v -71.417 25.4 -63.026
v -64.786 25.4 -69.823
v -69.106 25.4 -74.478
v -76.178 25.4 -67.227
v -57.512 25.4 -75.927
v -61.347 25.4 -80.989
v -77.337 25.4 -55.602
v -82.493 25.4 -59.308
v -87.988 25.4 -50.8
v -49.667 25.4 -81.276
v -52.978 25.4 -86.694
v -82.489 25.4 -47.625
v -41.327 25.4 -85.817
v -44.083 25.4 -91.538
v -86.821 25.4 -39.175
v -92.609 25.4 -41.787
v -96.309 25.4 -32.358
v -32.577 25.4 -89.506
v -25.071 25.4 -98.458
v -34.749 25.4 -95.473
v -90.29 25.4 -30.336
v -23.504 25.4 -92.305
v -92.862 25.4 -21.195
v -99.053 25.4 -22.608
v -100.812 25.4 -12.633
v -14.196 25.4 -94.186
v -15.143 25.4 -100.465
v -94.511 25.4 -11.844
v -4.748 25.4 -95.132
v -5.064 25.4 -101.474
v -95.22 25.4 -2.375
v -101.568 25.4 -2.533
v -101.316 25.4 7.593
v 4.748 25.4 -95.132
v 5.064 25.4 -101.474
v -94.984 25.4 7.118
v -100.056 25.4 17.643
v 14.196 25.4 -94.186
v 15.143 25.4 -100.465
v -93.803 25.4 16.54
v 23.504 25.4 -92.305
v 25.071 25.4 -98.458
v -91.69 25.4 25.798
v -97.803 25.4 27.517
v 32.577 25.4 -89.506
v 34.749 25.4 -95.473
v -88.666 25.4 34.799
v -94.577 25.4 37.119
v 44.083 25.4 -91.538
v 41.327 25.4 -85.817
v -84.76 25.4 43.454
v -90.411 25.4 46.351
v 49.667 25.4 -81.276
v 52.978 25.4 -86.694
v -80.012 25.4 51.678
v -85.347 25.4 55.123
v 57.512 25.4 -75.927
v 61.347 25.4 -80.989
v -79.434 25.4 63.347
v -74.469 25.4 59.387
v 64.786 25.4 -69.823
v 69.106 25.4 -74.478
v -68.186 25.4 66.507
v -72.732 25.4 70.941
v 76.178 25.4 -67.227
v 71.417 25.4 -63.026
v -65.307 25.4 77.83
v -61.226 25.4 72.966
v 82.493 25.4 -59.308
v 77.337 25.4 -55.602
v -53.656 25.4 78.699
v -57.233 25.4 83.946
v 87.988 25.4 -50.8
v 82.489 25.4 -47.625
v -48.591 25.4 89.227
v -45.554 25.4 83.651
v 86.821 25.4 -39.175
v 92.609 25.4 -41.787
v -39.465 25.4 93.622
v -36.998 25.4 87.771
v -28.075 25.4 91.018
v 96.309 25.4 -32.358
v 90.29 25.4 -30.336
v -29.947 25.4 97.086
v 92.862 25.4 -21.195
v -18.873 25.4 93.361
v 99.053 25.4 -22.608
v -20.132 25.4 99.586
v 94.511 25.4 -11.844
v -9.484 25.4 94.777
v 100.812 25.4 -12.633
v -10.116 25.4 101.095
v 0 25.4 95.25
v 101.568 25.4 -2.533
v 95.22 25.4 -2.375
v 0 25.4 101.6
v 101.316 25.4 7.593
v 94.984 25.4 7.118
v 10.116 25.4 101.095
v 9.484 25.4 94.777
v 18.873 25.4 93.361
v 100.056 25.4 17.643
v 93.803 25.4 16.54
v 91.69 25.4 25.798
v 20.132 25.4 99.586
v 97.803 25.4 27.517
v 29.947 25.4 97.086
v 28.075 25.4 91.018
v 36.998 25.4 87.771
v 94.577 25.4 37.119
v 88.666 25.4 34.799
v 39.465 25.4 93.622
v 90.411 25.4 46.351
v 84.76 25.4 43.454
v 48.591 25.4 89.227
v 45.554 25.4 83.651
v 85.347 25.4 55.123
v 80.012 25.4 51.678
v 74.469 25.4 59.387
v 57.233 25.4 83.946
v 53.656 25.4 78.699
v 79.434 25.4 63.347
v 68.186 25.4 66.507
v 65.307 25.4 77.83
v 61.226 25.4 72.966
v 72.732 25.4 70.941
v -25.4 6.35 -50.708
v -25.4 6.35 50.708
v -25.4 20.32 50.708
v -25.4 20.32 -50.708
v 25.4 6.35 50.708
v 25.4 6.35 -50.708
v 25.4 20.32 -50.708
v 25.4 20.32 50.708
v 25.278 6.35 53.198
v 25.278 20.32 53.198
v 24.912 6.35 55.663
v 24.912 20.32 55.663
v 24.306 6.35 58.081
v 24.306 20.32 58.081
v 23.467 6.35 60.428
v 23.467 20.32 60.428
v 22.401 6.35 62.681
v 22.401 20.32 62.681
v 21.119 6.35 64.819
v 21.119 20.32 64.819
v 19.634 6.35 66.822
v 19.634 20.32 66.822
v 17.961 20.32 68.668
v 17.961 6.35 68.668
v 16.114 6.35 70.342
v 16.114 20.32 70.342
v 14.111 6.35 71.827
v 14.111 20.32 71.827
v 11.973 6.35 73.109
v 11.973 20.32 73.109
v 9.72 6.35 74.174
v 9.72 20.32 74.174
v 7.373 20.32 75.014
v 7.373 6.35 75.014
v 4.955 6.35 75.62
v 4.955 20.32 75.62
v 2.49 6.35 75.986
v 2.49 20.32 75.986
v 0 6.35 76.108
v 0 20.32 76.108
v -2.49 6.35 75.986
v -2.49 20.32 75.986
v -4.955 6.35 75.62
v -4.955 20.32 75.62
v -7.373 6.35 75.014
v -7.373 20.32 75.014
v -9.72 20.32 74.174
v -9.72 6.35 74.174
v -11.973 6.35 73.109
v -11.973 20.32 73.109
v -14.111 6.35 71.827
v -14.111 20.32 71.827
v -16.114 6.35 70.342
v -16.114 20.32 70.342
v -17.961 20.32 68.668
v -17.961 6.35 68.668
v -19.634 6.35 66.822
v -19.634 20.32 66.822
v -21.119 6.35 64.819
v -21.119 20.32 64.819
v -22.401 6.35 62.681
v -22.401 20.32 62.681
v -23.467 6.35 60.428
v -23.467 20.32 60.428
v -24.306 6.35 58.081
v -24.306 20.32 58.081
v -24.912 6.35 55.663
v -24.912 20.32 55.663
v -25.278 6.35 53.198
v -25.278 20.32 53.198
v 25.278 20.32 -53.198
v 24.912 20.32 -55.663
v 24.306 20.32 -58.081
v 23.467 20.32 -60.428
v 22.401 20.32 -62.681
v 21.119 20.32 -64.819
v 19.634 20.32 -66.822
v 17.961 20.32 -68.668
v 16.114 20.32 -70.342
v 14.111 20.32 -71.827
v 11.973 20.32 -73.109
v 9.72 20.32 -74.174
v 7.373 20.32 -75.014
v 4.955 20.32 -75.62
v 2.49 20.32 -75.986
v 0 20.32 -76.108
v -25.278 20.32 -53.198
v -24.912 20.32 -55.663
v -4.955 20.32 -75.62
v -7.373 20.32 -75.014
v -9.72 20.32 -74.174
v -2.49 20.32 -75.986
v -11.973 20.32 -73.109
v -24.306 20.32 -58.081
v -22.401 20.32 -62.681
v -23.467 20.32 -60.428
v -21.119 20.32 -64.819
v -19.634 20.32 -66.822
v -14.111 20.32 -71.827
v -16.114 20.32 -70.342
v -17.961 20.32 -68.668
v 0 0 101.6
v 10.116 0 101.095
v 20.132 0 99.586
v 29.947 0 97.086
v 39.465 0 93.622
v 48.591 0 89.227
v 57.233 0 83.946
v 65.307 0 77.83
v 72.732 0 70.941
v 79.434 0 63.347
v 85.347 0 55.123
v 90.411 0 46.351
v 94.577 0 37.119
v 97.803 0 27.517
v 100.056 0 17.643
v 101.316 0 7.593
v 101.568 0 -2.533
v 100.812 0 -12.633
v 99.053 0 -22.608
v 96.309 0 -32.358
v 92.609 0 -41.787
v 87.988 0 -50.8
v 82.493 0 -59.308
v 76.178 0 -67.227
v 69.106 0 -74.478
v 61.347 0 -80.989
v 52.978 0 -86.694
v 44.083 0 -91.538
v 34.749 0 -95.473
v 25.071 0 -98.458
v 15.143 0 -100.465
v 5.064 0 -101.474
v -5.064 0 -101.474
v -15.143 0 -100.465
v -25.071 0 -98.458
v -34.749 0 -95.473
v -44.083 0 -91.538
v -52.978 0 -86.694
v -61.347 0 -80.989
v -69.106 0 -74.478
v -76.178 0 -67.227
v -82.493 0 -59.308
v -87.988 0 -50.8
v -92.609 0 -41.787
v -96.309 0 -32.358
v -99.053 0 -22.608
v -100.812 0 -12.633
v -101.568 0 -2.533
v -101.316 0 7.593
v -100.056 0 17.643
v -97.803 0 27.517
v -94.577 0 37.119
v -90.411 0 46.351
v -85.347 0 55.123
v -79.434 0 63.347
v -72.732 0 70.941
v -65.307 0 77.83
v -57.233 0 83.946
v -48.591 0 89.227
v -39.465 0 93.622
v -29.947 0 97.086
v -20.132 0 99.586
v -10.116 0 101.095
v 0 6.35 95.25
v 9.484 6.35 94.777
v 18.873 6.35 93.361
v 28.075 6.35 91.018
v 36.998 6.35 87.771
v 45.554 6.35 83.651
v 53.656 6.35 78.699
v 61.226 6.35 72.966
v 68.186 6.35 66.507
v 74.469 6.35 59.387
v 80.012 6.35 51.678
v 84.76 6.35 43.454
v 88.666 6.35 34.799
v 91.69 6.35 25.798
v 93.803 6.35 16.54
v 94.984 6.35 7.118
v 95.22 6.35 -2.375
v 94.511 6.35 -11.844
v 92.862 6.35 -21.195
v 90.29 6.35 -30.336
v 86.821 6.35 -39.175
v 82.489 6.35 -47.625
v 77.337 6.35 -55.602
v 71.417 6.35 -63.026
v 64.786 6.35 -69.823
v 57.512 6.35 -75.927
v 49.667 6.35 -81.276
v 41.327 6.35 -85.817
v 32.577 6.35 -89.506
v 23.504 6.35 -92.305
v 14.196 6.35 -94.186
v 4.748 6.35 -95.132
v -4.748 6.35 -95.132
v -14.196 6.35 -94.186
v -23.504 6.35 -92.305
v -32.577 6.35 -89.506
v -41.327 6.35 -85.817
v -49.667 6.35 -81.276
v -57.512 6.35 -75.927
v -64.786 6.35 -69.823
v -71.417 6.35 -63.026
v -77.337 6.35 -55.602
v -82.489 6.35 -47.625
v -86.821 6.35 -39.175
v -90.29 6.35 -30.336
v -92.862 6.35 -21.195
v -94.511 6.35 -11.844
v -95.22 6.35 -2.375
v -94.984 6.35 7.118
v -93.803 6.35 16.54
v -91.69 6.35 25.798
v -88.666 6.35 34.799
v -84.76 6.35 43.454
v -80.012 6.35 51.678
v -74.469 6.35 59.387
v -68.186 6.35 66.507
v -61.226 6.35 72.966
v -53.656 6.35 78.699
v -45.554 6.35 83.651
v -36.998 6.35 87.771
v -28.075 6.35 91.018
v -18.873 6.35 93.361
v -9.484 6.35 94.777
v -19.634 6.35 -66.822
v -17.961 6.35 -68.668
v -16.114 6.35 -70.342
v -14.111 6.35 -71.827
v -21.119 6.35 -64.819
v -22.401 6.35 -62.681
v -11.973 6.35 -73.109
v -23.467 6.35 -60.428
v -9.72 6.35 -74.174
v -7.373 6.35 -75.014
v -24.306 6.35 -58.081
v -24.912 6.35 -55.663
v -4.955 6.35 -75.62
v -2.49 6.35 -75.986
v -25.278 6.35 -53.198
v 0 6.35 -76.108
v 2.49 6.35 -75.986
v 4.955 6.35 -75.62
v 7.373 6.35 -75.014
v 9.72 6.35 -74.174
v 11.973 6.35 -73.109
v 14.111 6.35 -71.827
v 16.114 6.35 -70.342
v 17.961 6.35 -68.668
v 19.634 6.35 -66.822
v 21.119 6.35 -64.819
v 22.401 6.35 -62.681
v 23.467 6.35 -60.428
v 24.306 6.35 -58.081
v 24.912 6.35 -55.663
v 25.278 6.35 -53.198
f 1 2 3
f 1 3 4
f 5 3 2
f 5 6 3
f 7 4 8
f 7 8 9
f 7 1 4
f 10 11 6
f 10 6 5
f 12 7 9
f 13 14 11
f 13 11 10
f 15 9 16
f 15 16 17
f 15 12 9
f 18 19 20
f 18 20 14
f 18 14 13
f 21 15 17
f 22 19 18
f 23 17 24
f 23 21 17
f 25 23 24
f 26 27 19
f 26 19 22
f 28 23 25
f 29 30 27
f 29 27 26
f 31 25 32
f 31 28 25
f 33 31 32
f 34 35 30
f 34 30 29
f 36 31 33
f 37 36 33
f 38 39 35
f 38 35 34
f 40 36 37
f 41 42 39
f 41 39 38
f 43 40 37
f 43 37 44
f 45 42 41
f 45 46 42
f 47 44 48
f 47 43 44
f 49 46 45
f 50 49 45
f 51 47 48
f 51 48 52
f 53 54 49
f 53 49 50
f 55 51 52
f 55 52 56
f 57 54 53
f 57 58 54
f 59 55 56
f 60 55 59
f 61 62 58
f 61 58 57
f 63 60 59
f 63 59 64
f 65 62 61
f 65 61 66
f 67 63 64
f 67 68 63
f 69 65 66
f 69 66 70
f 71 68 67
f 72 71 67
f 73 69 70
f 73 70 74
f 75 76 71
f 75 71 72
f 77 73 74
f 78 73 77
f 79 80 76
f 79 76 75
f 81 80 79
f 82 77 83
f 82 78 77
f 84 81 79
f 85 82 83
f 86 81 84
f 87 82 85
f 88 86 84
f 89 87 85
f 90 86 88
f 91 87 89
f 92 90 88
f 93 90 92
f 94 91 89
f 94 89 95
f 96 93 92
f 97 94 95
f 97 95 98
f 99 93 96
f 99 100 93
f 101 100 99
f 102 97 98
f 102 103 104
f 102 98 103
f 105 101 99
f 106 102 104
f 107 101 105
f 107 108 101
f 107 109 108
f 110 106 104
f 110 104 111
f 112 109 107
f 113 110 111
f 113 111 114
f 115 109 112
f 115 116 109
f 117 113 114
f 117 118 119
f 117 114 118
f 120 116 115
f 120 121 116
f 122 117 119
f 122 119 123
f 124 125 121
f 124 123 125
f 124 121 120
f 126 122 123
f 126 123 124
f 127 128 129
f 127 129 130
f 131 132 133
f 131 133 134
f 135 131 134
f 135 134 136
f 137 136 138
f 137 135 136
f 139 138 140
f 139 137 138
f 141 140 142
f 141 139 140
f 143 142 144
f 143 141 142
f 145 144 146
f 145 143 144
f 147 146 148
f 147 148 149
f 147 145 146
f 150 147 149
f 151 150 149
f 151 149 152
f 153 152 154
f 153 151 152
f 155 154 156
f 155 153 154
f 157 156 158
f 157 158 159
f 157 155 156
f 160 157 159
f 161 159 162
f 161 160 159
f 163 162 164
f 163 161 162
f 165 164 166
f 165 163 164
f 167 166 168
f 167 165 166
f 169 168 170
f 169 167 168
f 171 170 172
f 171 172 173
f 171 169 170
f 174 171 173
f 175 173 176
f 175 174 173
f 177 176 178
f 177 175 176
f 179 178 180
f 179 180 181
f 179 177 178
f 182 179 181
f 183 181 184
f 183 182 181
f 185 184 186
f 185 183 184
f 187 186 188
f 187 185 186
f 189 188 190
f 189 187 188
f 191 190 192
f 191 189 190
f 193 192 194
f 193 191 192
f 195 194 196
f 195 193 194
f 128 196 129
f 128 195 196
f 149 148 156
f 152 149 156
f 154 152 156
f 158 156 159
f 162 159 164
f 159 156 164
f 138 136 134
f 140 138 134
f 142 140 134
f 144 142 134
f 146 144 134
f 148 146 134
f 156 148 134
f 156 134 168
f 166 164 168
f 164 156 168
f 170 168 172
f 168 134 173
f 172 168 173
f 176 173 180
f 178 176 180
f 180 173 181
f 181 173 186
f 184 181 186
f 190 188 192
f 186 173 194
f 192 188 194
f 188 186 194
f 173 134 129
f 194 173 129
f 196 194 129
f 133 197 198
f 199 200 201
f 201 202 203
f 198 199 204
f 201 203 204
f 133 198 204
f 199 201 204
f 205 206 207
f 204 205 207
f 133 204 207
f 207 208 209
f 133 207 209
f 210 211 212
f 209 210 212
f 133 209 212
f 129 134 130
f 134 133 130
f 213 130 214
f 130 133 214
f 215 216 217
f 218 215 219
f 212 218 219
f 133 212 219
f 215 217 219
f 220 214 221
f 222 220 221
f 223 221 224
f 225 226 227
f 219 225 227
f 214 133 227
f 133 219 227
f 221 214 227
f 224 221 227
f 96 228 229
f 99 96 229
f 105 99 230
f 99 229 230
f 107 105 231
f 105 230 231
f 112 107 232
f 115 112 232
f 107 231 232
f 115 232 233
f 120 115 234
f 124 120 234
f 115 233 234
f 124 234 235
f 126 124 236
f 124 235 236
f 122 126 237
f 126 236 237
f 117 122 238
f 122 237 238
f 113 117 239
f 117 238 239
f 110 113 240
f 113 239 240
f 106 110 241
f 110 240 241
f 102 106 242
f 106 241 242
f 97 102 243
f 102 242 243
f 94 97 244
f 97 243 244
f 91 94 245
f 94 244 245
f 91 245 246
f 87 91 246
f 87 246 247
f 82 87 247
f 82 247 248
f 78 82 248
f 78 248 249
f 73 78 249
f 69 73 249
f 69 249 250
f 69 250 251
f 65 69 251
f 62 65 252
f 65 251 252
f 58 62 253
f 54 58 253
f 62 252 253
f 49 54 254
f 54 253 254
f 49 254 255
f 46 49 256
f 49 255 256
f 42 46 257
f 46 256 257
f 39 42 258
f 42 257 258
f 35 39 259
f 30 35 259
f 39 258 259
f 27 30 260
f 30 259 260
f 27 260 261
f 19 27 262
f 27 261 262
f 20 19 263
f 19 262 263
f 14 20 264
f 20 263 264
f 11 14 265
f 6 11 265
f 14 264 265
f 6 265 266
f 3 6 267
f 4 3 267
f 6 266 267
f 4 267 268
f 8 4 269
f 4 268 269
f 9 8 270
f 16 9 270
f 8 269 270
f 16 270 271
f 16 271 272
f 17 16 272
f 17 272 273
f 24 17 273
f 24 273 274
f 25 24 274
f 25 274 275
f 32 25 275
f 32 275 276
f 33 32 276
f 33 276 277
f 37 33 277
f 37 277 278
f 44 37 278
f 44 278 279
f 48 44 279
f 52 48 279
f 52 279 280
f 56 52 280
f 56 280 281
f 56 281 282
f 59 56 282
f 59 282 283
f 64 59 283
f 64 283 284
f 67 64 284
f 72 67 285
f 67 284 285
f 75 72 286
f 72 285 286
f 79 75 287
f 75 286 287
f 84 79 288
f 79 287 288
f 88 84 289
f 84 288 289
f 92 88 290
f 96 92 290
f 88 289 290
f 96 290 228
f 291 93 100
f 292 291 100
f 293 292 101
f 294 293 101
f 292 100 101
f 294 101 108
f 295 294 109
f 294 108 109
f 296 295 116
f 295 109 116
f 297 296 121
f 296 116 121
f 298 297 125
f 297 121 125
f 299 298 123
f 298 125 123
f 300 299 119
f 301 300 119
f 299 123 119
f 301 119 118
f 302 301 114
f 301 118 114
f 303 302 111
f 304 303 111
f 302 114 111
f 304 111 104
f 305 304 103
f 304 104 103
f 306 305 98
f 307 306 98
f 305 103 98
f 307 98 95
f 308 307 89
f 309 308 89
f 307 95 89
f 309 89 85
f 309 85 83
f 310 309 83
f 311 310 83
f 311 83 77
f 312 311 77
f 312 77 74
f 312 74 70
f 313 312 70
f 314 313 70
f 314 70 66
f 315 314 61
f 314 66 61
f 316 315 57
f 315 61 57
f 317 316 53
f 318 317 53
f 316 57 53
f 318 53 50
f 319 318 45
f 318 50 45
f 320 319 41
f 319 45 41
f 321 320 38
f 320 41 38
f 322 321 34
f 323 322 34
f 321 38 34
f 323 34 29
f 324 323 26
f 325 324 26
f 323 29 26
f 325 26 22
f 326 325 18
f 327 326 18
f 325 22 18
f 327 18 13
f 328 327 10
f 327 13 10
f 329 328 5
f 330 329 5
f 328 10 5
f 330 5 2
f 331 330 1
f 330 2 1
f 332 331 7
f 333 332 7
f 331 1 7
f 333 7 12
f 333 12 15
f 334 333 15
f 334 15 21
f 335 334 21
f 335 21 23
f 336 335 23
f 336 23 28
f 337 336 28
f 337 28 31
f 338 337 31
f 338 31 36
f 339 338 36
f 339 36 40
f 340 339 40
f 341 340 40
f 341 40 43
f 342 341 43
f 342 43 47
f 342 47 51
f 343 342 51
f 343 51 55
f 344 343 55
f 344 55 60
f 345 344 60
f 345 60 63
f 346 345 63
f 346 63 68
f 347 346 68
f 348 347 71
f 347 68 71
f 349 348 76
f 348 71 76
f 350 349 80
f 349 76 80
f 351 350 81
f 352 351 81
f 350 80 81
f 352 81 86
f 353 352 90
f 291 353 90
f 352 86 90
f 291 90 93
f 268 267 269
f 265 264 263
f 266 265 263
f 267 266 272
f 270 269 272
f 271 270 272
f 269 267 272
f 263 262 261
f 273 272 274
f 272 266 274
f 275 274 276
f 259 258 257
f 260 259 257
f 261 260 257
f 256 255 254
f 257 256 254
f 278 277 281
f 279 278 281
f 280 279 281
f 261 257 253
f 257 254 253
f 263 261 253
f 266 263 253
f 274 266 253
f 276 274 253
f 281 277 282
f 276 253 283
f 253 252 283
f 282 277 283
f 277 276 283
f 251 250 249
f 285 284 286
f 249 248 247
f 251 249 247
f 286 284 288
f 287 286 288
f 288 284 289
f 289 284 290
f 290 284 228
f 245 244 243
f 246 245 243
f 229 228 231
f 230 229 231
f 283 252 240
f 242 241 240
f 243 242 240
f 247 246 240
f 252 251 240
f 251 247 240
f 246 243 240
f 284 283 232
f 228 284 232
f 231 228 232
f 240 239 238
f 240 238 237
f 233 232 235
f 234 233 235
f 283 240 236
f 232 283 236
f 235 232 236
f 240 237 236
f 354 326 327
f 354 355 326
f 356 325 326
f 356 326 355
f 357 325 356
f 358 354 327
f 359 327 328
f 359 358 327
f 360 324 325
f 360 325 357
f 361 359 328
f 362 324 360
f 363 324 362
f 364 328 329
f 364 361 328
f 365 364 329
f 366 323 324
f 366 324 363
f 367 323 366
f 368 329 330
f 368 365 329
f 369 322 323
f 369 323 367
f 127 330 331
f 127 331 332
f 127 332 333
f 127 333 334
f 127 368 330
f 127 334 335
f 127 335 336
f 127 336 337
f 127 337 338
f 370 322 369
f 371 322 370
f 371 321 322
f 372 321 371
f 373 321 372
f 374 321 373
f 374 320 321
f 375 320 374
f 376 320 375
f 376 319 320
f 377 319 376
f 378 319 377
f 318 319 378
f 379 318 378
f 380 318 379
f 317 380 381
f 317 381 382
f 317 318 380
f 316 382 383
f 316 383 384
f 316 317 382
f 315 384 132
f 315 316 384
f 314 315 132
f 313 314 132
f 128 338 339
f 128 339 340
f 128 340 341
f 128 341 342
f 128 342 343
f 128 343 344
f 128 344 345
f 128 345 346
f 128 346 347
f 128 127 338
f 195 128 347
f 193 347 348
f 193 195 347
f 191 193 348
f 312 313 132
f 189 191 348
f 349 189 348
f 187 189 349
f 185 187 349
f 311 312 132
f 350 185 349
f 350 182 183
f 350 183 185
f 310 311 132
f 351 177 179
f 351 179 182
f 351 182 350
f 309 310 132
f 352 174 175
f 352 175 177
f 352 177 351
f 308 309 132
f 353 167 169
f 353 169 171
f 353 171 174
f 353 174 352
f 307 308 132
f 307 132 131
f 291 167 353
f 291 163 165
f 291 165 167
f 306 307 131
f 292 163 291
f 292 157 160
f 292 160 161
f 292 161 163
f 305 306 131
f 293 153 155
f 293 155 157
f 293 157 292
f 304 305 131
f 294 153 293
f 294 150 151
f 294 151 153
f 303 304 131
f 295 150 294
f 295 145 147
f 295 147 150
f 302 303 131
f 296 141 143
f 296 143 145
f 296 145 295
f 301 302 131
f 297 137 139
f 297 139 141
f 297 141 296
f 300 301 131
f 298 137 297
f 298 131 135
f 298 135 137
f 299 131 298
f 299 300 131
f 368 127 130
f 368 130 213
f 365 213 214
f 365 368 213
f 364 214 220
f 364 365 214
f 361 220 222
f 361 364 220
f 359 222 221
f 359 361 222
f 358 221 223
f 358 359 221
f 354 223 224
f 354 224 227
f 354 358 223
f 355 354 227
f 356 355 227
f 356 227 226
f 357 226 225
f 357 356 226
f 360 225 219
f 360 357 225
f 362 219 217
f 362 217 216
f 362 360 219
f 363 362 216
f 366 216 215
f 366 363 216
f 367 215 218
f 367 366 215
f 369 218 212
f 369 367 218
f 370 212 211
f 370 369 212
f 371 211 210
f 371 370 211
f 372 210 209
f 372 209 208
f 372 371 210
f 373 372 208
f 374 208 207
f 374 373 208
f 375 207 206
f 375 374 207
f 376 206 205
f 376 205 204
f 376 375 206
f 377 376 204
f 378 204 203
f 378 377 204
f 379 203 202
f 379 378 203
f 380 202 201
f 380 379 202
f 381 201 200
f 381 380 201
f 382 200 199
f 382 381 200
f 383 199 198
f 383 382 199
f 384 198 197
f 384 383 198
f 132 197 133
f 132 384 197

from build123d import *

# Parameters (mm, degrees)
SKETCH1_R           = 101.6
BOSS_EXTRUDE1_DEPTH = 25.4
SKETCH3_R           = 95.25
CUT_EXTRUDE1_DEPTH  = 19.05
BOSS_EXTRUDE2_DEPTH = 13.97


with BuildPart() as part:
    # Sketch1 → Boss-Extrude1 (new body)
    with BuildSketch(Plane(origin=(0, 0, 0), x_dir=(1, 0, 0), z_dir=(0, 1, 0))):
        with Locations(Location((0, 0, 0), (0, 0, 270))):
            Circle(SKETCH1_R)
    extrude(amount=BOSS_EXTRUDE1_DEPTH)

    # Sketch3 → Cut-Extrude1 (cut)
    with BuildSketch(Plane(origin=(0, 25.4, 0), x_dir=(1, 0, 0), z_dir=(0, 1, 0))):
        with Locations(Location((0, 0, 0), (0, 0, 270))):
            Circle(SKETCH3_R)
    extrude(amount=-CUT_EXTRUDE1_DEPTH, mode=Mode.SUBTRACT)

    # Sketch5 → Boss-Extrude2 (add)
    with BuildSketch(Plane(origin=(0, 6.35, 0), x_dir=(1, 0, 0), z_dir=(0, 1, 0))):
        with BuildLine():
            Line((-25.4, -50.707939874), (-25.4, 50.707939874))
            ThreePointArc((-25.4, 50.707939874), (0, 76.107939874), (25.4, 50.707939874))
            Line((25.4, 50.707939874), (25.4, -50.707939874))
            ThreePointArc((25.4, -50.707939874), (0, -76.107939874), (-25.4, -50.707939874))
        make_face()
    extrude(amount=BOSS_EXTRUDE2_DEPTH)


solid = part.part
